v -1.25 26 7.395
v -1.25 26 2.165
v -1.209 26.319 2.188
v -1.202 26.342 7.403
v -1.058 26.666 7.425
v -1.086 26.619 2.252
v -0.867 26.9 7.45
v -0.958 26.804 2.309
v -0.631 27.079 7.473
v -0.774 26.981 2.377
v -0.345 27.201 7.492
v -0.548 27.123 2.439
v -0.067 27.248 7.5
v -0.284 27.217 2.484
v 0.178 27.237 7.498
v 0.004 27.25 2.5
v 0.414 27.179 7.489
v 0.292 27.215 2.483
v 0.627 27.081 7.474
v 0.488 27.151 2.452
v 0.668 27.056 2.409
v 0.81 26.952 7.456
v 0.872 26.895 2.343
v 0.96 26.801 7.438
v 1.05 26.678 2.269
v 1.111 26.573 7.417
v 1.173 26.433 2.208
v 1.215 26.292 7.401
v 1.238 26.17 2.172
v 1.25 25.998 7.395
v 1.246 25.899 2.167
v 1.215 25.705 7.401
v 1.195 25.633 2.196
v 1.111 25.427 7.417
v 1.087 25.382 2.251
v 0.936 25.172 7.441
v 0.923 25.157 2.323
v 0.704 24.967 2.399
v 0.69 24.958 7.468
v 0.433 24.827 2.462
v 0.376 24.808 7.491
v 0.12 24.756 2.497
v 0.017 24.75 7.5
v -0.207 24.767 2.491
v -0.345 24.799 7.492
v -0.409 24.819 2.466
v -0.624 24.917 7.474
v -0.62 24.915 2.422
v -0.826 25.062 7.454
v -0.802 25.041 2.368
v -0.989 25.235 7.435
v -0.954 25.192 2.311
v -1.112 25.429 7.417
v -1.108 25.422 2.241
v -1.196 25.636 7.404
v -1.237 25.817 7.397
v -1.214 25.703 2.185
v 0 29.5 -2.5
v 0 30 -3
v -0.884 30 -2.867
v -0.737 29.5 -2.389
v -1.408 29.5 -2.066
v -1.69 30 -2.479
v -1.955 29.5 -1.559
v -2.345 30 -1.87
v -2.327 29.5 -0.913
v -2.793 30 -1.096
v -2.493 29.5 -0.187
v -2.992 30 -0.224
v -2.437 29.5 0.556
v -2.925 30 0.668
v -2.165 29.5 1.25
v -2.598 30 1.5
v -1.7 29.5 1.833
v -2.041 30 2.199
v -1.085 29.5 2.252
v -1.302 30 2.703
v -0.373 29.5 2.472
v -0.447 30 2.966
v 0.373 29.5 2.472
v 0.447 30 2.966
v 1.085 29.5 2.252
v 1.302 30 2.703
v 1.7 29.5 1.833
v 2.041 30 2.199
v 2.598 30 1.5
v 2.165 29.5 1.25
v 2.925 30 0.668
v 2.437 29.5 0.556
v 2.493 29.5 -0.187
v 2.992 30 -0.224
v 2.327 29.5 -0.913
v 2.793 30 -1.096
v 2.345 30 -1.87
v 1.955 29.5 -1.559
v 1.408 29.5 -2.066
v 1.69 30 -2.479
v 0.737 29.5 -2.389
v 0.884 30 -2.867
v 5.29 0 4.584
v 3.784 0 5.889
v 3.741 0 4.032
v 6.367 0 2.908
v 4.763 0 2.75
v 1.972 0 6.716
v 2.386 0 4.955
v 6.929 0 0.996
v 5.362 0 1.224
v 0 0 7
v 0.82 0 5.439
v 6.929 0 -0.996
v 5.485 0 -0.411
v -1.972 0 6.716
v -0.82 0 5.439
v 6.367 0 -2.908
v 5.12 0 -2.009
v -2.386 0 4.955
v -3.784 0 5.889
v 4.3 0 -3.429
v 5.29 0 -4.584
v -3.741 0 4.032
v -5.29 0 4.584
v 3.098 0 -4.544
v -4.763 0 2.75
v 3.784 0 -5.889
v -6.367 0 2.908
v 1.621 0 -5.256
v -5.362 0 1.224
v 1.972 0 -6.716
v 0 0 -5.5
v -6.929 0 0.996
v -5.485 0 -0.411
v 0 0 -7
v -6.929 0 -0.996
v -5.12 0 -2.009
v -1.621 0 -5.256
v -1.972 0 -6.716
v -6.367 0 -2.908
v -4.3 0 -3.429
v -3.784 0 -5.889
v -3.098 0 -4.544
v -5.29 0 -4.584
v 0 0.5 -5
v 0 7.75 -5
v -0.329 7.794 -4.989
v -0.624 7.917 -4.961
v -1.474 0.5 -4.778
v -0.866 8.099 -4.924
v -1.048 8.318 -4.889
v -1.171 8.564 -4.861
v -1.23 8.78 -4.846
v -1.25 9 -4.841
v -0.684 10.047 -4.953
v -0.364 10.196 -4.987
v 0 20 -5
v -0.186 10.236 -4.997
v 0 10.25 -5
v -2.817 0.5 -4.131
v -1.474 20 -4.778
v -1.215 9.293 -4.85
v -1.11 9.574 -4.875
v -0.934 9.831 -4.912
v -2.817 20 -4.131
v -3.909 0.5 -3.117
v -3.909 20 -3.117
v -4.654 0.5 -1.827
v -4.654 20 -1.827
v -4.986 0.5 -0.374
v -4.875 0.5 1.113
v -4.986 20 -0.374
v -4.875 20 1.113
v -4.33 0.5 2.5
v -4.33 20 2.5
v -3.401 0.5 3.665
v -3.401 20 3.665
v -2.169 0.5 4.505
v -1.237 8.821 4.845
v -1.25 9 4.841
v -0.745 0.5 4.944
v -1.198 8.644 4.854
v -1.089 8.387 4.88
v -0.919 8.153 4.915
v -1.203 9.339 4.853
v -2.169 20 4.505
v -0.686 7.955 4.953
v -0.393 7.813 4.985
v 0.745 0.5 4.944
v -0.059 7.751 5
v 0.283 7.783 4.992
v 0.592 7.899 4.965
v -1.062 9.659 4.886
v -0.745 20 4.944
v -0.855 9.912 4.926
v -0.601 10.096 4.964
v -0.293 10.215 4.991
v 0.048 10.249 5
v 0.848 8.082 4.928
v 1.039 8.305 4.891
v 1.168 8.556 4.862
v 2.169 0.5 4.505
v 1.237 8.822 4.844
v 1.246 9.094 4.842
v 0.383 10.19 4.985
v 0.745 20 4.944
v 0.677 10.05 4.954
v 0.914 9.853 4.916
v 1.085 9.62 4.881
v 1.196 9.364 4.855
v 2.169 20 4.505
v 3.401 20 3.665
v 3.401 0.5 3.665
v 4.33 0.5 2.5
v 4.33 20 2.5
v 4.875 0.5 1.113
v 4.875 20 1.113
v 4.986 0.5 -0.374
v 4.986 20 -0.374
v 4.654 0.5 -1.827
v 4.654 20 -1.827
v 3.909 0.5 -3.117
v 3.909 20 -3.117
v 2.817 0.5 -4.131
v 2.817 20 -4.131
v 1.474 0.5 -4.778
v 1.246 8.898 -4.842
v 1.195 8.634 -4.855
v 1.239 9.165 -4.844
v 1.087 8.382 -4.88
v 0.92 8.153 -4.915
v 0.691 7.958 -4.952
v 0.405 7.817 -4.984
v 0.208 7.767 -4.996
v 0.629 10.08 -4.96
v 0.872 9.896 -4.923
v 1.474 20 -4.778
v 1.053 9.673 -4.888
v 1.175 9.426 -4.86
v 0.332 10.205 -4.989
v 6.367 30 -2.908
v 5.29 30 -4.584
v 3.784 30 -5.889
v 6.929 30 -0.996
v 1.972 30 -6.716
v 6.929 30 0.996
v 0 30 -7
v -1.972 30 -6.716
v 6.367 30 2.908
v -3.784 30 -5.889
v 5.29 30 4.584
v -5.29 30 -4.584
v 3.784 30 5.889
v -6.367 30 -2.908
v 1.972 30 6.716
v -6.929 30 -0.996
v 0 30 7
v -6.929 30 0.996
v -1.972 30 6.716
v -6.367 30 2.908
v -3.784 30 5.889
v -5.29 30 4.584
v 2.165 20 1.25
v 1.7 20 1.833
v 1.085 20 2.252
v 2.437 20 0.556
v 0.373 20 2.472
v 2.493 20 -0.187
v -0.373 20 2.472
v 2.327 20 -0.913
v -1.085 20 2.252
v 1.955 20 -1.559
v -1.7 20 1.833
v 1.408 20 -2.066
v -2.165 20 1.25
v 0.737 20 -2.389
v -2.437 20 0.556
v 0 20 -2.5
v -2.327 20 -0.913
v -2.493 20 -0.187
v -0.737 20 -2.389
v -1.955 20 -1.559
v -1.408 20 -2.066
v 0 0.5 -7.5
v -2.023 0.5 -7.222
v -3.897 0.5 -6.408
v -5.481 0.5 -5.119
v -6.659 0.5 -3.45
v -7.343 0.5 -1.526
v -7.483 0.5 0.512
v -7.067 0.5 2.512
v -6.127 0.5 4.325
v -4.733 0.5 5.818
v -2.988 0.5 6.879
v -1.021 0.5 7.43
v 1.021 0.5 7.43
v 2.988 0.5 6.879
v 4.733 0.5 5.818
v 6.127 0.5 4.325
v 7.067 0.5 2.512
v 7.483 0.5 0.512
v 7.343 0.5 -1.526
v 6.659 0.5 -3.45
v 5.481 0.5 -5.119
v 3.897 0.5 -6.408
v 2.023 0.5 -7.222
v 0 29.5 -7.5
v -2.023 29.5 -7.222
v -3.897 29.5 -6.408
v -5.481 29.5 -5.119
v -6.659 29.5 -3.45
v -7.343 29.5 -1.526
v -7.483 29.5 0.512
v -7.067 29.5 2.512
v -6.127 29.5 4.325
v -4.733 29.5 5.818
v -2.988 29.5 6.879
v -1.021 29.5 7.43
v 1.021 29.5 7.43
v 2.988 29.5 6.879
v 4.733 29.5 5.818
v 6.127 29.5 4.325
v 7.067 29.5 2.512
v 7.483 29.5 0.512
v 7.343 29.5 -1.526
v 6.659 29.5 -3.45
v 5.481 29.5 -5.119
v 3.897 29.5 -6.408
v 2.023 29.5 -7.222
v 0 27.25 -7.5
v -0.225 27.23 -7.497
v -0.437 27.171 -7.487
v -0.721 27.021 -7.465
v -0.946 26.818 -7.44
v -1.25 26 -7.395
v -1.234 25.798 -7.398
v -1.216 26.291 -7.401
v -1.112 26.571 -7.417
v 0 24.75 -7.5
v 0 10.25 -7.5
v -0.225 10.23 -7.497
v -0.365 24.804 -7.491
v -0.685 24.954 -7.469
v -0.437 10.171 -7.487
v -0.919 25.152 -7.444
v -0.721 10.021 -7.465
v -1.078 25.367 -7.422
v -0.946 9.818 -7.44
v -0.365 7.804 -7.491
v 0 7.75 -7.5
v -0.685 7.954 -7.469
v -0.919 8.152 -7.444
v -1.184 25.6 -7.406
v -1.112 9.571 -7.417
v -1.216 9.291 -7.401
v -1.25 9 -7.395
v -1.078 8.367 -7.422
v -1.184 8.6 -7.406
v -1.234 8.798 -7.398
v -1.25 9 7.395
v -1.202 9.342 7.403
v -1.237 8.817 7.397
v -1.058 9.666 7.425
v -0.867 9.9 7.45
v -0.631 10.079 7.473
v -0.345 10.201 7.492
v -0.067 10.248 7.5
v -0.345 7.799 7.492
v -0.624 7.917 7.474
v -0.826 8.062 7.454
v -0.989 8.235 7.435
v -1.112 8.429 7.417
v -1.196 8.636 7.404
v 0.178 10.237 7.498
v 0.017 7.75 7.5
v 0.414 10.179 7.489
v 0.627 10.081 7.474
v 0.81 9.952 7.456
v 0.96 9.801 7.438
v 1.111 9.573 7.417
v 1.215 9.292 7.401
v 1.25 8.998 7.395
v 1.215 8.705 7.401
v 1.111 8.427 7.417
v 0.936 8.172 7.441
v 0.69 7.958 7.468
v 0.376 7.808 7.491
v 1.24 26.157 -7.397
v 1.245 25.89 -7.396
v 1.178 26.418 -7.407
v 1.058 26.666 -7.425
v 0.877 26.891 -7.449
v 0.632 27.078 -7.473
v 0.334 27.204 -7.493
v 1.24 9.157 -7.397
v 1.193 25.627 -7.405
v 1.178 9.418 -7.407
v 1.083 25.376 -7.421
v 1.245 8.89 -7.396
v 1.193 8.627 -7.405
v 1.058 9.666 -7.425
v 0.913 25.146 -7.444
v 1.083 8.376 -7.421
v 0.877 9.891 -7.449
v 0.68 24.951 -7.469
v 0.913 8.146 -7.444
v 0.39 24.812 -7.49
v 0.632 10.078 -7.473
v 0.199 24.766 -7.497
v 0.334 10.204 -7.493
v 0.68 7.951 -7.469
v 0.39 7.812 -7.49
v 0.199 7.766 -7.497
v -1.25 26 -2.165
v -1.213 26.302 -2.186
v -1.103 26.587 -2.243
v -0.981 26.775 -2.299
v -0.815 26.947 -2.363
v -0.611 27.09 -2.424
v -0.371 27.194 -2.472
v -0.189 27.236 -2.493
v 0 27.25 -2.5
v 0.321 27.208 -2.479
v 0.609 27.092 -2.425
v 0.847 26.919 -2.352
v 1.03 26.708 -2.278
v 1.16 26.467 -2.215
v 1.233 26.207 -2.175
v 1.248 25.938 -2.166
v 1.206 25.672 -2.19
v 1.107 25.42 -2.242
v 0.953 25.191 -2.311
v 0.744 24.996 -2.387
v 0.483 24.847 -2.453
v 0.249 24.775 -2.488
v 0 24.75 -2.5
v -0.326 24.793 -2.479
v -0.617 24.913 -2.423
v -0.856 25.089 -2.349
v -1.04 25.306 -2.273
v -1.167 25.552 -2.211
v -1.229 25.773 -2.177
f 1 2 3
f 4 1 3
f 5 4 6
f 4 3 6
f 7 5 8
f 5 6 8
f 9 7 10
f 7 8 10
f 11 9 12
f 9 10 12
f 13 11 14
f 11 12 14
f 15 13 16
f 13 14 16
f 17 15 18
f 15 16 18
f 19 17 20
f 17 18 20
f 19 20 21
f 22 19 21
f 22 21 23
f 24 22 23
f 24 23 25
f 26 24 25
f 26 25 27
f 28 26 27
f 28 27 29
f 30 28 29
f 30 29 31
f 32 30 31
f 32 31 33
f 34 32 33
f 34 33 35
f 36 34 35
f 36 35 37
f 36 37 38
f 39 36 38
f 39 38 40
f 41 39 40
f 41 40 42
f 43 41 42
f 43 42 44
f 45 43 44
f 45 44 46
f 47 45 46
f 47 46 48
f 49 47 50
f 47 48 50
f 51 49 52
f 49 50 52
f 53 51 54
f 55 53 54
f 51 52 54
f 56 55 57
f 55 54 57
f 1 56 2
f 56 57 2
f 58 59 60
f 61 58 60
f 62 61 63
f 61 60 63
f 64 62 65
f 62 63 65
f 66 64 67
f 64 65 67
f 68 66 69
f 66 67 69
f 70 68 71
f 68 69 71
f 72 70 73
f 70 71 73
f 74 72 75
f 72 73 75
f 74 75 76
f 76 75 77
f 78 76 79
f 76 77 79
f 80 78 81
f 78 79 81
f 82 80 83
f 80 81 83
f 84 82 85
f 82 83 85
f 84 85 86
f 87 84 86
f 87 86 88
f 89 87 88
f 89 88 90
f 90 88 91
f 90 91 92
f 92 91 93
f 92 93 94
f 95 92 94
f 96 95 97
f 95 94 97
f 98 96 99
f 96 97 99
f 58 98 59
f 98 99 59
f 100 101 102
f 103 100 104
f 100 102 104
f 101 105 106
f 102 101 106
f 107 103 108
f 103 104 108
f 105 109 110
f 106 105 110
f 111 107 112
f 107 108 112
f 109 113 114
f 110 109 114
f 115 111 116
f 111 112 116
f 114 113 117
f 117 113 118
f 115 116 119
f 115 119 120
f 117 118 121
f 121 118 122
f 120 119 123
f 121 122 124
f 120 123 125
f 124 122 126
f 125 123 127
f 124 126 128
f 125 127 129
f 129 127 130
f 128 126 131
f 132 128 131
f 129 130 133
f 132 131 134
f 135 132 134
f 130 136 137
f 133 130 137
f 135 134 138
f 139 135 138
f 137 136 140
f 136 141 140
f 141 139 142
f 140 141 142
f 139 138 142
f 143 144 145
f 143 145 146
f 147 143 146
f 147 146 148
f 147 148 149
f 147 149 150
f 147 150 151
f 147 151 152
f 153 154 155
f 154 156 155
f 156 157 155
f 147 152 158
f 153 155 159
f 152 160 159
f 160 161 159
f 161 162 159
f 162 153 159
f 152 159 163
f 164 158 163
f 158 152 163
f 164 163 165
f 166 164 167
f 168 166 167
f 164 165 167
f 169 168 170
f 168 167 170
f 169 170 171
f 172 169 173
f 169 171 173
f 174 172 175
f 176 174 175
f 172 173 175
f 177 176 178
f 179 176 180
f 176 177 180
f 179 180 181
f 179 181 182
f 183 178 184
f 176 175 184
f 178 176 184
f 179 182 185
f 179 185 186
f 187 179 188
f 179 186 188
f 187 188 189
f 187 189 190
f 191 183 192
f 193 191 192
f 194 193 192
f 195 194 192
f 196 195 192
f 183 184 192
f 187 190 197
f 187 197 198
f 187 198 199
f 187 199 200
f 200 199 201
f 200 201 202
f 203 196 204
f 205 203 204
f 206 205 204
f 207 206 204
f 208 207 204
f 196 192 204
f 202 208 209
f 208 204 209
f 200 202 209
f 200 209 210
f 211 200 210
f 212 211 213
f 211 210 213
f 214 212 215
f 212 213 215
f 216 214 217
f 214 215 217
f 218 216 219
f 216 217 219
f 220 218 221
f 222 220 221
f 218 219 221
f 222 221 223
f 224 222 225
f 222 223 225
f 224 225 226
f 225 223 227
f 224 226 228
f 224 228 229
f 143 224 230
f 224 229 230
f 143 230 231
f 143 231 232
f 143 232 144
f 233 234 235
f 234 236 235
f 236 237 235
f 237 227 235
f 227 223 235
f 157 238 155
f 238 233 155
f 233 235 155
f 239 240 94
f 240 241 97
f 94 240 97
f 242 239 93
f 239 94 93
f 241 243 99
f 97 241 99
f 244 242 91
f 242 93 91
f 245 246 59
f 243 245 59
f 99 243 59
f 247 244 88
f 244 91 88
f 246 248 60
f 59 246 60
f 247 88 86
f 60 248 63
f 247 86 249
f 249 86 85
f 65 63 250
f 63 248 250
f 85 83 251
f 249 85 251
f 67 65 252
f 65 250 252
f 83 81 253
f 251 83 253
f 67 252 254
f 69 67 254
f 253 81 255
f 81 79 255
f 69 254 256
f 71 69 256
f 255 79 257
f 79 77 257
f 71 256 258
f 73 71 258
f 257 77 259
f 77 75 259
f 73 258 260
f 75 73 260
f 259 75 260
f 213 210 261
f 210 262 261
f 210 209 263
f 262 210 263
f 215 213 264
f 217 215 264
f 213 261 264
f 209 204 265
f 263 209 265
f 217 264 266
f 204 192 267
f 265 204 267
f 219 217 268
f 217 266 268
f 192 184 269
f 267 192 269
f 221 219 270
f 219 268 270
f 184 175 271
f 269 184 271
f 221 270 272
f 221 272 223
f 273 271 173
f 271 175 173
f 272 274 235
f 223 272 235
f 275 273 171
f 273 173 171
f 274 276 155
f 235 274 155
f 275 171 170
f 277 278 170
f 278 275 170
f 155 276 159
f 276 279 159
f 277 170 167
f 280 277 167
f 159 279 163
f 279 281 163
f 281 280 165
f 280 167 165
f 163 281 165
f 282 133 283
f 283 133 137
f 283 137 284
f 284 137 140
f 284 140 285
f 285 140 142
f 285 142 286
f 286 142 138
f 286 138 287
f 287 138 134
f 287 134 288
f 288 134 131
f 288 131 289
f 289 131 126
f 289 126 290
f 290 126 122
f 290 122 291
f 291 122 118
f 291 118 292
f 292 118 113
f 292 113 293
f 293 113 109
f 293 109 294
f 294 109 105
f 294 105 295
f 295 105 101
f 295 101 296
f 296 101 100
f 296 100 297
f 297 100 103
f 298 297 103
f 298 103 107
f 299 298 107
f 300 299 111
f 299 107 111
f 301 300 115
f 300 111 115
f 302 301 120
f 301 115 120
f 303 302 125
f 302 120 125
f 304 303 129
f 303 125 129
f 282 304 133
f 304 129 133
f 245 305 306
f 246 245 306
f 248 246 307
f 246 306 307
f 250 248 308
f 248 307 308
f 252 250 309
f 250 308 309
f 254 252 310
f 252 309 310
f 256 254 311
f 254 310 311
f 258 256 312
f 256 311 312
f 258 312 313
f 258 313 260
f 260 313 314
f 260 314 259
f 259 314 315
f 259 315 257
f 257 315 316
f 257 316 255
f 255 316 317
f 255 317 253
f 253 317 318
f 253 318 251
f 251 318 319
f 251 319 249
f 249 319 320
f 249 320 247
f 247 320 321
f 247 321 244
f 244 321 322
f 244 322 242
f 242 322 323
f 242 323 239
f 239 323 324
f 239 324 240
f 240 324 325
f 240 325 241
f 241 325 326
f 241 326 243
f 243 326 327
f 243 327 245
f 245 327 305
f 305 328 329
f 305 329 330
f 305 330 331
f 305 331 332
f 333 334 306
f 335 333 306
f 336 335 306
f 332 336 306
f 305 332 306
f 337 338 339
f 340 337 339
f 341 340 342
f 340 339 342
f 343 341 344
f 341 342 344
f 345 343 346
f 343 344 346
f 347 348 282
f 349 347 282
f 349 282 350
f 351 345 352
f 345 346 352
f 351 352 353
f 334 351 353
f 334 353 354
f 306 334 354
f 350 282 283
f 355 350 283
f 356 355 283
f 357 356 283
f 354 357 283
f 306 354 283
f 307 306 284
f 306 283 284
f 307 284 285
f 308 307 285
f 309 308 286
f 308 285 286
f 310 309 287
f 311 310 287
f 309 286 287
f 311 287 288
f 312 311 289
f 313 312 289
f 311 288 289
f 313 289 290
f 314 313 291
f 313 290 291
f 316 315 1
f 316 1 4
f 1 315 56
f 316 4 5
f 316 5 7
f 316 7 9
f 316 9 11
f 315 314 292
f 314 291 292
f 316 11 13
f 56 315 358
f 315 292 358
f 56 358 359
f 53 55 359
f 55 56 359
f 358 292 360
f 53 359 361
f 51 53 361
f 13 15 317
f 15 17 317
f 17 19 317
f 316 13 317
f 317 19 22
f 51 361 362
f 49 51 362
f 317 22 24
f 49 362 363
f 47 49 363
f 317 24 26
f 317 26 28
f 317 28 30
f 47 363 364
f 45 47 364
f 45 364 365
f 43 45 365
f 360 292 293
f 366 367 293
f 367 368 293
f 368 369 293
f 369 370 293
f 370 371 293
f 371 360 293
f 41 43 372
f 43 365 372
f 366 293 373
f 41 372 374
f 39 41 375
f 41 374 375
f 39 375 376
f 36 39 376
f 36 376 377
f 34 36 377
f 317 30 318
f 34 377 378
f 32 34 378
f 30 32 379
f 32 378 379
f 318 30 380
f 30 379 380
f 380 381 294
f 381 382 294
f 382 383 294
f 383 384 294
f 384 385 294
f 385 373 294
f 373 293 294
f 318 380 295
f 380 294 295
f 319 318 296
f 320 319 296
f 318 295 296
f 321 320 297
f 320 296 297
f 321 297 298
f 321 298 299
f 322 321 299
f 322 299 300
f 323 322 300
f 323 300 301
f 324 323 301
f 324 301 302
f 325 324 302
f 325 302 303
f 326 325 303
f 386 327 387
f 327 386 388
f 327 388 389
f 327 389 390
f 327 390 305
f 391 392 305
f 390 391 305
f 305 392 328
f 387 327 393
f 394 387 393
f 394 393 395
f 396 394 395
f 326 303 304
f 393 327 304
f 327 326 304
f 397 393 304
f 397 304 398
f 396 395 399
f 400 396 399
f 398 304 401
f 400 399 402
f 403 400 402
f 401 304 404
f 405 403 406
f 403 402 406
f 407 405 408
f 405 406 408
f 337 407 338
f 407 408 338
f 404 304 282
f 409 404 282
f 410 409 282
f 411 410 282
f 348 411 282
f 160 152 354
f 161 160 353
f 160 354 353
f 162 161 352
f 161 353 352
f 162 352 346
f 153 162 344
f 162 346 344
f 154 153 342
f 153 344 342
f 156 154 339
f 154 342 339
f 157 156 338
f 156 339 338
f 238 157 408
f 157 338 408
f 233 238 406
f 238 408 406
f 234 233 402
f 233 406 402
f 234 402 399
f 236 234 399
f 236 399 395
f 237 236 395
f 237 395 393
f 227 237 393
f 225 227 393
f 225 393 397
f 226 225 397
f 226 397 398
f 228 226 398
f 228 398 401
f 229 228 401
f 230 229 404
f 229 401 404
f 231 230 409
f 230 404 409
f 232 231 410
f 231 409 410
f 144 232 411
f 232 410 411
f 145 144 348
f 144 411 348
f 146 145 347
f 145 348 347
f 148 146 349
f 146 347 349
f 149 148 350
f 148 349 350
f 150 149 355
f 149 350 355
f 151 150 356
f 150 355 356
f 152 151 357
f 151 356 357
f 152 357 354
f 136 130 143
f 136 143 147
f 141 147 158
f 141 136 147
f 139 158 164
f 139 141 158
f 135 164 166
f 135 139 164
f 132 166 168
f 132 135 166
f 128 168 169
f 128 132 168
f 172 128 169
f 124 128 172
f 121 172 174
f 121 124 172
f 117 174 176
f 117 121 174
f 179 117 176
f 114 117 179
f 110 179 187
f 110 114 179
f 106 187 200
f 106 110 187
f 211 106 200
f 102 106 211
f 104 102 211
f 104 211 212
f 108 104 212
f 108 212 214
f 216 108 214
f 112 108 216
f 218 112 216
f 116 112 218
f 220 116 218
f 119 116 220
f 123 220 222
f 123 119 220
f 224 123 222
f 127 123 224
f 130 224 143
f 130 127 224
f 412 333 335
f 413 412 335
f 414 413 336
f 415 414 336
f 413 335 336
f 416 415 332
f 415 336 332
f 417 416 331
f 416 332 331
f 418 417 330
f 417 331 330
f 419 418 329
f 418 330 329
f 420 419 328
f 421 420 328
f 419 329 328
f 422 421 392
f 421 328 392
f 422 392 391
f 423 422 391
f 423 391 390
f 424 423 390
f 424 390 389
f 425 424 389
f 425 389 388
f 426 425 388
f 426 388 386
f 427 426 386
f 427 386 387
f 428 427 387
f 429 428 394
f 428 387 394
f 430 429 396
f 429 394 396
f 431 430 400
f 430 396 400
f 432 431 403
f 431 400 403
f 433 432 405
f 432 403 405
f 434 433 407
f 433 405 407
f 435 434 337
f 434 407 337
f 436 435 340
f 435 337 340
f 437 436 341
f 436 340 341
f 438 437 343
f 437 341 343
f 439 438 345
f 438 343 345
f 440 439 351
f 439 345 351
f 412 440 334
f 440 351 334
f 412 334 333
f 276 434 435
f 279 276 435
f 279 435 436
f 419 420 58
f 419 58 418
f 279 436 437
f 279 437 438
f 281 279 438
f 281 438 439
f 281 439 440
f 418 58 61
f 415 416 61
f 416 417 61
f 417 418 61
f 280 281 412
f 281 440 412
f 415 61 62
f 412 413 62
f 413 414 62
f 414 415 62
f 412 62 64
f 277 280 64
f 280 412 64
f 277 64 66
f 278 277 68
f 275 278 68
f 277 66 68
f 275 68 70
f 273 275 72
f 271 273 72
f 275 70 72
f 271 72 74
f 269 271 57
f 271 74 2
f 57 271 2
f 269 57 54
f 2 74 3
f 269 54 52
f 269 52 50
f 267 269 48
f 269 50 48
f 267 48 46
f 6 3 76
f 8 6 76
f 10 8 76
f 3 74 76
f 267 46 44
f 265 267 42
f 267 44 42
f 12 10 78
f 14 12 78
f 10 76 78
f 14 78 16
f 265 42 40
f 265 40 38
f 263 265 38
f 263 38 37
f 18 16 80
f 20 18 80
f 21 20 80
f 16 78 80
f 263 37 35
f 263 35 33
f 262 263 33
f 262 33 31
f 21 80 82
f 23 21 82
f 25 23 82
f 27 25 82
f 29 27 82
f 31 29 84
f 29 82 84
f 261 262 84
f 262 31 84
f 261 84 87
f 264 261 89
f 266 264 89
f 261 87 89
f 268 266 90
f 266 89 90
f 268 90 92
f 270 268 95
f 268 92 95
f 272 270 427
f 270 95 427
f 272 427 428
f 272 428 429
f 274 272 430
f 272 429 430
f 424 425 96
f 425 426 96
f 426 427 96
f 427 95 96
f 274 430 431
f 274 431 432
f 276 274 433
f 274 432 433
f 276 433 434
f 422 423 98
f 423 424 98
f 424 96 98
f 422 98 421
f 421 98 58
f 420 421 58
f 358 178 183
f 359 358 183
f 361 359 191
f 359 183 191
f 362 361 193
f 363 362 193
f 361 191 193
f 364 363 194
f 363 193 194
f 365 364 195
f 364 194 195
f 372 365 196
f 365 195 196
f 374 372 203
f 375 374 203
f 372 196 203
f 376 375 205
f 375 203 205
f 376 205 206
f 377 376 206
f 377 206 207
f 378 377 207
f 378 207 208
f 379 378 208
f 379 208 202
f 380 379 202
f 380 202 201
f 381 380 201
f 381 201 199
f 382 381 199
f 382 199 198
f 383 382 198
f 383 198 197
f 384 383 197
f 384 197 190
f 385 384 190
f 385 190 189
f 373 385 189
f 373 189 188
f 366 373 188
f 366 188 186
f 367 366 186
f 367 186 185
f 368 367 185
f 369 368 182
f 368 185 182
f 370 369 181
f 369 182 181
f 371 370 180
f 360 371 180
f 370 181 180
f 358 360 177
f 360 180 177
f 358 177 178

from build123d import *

# Parameters (mm, degrees)
CHAMFER_1_SIZE     = 0.5
HOLE_WIZARD_M3_2_D = 2.5


with BuildPart() as part:
    # 草图1 → 旋转1 (revolve)
    with BuildSketch(Plane.XY, mode=Mode.PRIVATE) as revolve_1_sk:
        Polygon((5, 0), (5, 20), (2.5, 20), (2.5, 30), (7.5, 30), (7.5, 0), align=None)
    revolve(revolve_1_sk.sketch.rotate(Axis((0, 0, 0), (0, 1, 0)), 90), axis=Axis((0, 0, 0), (0, 1, 0)))

    # 倒角1
    chamfer_1_edges = [part.edges().sort_by_distance(p)[0] for p in [
        (0, 0, 7.5),
        (0, 30, 7.5),
        (0, 30, 2.5),
        (0, 0, 5),
    ]]
    chamfer(chamfer_1_edges, length=CHAMFER_1_SIZE)

    # M3 螺纹孔2 (through all)
    with Locations(Plane.XY.offset(7.5)):
        with Locations((0, 26), (0, 9)):
            Hole(HOLE_WIZARD_M3_2_D / 2)


solid = part.part
